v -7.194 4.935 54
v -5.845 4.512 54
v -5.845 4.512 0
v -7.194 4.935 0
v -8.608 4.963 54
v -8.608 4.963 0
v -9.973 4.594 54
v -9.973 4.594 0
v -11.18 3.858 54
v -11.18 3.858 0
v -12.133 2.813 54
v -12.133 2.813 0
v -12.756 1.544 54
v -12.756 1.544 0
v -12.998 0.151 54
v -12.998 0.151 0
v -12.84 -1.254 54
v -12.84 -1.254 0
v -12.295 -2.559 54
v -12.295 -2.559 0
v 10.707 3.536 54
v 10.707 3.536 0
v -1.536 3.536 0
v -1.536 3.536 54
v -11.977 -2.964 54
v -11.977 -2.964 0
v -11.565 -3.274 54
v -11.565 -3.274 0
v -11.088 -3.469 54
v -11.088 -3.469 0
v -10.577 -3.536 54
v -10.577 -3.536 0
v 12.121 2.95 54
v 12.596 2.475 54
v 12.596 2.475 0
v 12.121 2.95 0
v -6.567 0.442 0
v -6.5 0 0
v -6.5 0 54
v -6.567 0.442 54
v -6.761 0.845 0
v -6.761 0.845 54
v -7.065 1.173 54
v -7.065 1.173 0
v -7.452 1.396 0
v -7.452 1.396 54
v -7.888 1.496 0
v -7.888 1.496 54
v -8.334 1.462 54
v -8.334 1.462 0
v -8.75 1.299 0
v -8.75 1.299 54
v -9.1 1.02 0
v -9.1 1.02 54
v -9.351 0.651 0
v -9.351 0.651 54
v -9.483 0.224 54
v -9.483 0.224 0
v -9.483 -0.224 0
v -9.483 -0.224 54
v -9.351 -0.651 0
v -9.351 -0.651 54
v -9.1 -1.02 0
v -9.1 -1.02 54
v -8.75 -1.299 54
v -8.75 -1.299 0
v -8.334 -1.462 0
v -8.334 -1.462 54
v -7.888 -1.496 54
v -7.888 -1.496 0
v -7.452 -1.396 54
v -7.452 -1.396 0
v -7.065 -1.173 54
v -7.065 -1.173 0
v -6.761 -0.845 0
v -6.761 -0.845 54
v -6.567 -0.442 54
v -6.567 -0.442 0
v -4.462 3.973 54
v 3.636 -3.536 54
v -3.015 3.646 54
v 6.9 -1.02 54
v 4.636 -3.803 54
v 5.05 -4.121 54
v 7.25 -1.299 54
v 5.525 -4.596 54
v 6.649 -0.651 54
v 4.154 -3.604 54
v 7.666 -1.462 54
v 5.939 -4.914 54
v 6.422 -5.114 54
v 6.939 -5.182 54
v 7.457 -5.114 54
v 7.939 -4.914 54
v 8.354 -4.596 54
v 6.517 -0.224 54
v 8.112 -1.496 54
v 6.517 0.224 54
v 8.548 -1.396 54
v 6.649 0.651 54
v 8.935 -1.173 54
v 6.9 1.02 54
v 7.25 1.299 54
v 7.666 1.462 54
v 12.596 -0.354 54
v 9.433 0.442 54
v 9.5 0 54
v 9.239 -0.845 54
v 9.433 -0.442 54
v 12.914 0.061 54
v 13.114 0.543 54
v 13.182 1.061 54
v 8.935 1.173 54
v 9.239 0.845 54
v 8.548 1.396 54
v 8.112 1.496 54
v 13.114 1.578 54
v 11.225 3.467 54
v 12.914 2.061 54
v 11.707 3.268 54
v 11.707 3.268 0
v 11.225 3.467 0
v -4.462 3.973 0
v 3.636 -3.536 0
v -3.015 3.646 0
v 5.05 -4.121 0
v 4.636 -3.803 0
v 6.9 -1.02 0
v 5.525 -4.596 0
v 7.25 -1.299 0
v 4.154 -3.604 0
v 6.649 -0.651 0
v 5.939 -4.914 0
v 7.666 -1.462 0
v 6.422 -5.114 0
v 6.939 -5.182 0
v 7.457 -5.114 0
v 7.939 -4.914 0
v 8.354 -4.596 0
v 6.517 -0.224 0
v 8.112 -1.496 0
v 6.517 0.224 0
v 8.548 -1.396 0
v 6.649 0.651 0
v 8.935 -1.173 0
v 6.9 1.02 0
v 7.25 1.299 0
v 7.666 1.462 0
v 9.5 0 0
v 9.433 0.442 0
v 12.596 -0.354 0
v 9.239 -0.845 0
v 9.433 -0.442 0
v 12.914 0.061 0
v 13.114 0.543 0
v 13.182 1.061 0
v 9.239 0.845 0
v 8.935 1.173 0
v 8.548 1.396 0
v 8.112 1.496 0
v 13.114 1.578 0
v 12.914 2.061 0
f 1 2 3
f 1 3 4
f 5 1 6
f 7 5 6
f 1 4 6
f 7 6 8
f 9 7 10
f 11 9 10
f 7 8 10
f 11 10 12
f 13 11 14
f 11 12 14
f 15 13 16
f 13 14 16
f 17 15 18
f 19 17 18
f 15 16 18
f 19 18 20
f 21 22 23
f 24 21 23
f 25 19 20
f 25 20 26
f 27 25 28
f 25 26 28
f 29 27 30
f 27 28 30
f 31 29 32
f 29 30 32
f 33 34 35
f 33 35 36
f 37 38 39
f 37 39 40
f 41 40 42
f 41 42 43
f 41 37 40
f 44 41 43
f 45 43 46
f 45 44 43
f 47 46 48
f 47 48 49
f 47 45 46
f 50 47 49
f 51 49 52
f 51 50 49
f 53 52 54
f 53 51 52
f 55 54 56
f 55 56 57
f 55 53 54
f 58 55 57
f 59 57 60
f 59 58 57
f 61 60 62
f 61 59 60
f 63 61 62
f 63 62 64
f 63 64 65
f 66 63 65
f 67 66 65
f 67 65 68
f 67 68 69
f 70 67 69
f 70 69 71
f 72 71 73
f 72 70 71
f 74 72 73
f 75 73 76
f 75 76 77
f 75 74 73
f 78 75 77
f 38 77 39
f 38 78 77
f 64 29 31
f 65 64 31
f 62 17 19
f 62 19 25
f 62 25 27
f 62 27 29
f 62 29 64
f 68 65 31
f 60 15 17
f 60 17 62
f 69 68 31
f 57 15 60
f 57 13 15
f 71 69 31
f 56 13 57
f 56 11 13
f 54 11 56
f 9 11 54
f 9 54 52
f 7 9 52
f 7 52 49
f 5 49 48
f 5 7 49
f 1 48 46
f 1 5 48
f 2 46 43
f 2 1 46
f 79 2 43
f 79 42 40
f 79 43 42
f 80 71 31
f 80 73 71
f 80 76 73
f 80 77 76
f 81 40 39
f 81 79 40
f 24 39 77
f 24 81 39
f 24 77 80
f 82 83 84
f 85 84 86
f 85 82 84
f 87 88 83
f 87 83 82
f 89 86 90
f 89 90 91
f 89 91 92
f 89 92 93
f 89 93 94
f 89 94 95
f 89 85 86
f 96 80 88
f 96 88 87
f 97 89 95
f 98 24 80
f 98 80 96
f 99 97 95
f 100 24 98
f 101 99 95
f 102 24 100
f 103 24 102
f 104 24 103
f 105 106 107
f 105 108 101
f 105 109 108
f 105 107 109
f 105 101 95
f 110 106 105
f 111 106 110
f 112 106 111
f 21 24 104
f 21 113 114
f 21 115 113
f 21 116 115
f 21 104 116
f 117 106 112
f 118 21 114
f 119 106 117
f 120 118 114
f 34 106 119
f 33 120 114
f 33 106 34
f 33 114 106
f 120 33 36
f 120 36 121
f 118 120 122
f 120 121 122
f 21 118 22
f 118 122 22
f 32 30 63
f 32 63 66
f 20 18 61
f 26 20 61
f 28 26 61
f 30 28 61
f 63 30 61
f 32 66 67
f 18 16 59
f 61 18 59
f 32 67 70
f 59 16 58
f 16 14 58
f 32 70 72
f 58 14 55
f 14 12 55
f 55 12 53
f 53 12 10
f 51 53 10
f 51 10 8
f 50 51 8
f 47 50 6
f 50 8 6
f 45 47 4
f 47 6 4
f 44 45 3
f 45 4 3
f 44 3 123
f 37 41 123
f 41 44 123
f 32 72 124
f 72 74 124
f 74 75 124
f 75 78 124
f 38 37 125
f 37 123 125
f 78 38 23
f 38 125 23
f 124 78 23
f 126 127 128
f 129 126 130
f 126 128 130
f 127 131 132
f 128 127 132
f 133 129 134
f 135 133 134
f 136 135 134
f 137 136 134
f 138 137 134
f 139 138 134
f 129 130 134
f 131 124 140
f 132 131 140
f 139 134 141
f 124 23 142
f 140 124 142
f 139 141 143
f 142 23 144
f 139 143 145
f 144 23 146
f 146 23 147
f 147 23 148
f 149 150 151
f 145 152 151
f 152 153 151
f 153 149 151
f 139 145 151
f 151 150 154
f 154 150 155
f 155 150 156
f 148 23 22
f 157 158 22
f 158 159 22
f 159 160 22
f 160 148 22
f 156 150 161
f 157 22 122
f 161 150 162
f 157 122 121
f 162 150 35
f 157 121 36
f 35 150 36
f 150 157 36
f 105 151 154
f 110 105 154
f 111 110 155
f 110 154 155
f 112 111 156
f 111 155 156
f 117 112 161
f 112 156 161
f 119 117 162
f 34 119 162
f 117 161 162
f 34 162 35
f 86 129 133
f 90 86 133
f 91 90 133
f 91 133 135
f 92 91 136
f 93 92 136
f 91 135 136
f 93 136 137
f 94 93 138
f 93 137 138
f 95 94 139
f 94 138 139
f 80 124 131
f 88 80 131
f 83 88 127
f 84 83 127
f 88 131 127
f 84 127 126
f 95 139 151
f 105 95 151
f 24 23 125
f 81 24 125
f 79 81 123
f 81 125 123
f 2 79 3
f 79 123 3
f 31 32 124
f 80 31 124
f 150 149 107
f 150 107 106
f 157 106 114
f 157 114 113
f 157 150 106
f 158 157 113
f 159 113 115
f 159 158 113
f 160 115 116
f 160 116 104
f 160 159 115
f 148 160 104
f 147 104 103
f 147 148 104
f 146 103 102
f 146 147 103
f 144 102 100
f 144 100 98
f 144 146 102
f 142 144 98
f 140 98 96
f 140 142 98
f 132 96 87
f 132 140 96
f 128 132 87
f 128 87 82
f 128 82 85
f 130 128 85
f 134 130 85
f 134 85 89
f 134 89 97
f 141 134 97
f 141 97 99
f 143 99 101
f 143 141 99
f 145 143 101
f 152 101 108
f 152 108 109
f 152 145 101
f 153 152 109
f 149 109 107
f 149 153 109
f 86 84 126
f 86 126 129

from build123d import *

# Parameters (mm, degrees)
SKETCH_1_R      = 1.5
EXTRUDE_1_DEPTH = 54


with BuildPart() as part:
    # 草图1 → 凸台-拉伸1 (new body)
    with BuildSketch(Plane.XY):
        with BuildLine():
            Line((-10.577234103, -3.535533906), (3.636038969, -3.535533906))
            ThreePointArc((3.636038969, -3.535533906), (4.401405834, -3.687774841), (5.050252532, -4.121320344))
            Line((5.050252532, -4.121320344), (5.525126266, -4.596194078))
            ThreePointArc((5.525126266, -4.596194078), (6.939339828, -5.181980515), (8.353553391, -4.596194078))
            Line((8.353553391, -4.596194078), (12.596194078, -0.353553391))
            ThreePointArc((12.596194078, -0.353553391), (13.181980515, 1.060660172), (12.596194078, 2.474873734))
            Line((12.596194078, 2.474873734), (12.121320344, 2.949747468))
            ThreePointArc((12.121320344, 2.949747468), (11.472473646, 3.383292971), (10.707106781, 3.535533906))
            Line((10.707106781, 3.535533906), (-1.535533906, 3.535533906))
            ThreePointArc((-1.535533906, 3.535533906), (-3.744957733, 3.782665284), (-5.845177969, 4.511844635))
            ThreePointArc((-5.845177969, 4.511844635), (-11.693982673, 3.369642712), (-12.295390172, -2.559223177))
            ThreePointArc((-12.295390172, -2.559223177), (-11.565318477, -3.27440977), (-10.577234103, -3.535533906))
        make_face()
        with Locations((-8, 0)):
            Circle(SKETCH_1_R, mode=Mode.SUBTRACT)
        with Locations((8, 0)):
            Circle(SKETCH_1_R, mode=Mode.SUBTRACT)
    extrude(amount=EXTRUDE_1_DEPTH)


solid = part.part
